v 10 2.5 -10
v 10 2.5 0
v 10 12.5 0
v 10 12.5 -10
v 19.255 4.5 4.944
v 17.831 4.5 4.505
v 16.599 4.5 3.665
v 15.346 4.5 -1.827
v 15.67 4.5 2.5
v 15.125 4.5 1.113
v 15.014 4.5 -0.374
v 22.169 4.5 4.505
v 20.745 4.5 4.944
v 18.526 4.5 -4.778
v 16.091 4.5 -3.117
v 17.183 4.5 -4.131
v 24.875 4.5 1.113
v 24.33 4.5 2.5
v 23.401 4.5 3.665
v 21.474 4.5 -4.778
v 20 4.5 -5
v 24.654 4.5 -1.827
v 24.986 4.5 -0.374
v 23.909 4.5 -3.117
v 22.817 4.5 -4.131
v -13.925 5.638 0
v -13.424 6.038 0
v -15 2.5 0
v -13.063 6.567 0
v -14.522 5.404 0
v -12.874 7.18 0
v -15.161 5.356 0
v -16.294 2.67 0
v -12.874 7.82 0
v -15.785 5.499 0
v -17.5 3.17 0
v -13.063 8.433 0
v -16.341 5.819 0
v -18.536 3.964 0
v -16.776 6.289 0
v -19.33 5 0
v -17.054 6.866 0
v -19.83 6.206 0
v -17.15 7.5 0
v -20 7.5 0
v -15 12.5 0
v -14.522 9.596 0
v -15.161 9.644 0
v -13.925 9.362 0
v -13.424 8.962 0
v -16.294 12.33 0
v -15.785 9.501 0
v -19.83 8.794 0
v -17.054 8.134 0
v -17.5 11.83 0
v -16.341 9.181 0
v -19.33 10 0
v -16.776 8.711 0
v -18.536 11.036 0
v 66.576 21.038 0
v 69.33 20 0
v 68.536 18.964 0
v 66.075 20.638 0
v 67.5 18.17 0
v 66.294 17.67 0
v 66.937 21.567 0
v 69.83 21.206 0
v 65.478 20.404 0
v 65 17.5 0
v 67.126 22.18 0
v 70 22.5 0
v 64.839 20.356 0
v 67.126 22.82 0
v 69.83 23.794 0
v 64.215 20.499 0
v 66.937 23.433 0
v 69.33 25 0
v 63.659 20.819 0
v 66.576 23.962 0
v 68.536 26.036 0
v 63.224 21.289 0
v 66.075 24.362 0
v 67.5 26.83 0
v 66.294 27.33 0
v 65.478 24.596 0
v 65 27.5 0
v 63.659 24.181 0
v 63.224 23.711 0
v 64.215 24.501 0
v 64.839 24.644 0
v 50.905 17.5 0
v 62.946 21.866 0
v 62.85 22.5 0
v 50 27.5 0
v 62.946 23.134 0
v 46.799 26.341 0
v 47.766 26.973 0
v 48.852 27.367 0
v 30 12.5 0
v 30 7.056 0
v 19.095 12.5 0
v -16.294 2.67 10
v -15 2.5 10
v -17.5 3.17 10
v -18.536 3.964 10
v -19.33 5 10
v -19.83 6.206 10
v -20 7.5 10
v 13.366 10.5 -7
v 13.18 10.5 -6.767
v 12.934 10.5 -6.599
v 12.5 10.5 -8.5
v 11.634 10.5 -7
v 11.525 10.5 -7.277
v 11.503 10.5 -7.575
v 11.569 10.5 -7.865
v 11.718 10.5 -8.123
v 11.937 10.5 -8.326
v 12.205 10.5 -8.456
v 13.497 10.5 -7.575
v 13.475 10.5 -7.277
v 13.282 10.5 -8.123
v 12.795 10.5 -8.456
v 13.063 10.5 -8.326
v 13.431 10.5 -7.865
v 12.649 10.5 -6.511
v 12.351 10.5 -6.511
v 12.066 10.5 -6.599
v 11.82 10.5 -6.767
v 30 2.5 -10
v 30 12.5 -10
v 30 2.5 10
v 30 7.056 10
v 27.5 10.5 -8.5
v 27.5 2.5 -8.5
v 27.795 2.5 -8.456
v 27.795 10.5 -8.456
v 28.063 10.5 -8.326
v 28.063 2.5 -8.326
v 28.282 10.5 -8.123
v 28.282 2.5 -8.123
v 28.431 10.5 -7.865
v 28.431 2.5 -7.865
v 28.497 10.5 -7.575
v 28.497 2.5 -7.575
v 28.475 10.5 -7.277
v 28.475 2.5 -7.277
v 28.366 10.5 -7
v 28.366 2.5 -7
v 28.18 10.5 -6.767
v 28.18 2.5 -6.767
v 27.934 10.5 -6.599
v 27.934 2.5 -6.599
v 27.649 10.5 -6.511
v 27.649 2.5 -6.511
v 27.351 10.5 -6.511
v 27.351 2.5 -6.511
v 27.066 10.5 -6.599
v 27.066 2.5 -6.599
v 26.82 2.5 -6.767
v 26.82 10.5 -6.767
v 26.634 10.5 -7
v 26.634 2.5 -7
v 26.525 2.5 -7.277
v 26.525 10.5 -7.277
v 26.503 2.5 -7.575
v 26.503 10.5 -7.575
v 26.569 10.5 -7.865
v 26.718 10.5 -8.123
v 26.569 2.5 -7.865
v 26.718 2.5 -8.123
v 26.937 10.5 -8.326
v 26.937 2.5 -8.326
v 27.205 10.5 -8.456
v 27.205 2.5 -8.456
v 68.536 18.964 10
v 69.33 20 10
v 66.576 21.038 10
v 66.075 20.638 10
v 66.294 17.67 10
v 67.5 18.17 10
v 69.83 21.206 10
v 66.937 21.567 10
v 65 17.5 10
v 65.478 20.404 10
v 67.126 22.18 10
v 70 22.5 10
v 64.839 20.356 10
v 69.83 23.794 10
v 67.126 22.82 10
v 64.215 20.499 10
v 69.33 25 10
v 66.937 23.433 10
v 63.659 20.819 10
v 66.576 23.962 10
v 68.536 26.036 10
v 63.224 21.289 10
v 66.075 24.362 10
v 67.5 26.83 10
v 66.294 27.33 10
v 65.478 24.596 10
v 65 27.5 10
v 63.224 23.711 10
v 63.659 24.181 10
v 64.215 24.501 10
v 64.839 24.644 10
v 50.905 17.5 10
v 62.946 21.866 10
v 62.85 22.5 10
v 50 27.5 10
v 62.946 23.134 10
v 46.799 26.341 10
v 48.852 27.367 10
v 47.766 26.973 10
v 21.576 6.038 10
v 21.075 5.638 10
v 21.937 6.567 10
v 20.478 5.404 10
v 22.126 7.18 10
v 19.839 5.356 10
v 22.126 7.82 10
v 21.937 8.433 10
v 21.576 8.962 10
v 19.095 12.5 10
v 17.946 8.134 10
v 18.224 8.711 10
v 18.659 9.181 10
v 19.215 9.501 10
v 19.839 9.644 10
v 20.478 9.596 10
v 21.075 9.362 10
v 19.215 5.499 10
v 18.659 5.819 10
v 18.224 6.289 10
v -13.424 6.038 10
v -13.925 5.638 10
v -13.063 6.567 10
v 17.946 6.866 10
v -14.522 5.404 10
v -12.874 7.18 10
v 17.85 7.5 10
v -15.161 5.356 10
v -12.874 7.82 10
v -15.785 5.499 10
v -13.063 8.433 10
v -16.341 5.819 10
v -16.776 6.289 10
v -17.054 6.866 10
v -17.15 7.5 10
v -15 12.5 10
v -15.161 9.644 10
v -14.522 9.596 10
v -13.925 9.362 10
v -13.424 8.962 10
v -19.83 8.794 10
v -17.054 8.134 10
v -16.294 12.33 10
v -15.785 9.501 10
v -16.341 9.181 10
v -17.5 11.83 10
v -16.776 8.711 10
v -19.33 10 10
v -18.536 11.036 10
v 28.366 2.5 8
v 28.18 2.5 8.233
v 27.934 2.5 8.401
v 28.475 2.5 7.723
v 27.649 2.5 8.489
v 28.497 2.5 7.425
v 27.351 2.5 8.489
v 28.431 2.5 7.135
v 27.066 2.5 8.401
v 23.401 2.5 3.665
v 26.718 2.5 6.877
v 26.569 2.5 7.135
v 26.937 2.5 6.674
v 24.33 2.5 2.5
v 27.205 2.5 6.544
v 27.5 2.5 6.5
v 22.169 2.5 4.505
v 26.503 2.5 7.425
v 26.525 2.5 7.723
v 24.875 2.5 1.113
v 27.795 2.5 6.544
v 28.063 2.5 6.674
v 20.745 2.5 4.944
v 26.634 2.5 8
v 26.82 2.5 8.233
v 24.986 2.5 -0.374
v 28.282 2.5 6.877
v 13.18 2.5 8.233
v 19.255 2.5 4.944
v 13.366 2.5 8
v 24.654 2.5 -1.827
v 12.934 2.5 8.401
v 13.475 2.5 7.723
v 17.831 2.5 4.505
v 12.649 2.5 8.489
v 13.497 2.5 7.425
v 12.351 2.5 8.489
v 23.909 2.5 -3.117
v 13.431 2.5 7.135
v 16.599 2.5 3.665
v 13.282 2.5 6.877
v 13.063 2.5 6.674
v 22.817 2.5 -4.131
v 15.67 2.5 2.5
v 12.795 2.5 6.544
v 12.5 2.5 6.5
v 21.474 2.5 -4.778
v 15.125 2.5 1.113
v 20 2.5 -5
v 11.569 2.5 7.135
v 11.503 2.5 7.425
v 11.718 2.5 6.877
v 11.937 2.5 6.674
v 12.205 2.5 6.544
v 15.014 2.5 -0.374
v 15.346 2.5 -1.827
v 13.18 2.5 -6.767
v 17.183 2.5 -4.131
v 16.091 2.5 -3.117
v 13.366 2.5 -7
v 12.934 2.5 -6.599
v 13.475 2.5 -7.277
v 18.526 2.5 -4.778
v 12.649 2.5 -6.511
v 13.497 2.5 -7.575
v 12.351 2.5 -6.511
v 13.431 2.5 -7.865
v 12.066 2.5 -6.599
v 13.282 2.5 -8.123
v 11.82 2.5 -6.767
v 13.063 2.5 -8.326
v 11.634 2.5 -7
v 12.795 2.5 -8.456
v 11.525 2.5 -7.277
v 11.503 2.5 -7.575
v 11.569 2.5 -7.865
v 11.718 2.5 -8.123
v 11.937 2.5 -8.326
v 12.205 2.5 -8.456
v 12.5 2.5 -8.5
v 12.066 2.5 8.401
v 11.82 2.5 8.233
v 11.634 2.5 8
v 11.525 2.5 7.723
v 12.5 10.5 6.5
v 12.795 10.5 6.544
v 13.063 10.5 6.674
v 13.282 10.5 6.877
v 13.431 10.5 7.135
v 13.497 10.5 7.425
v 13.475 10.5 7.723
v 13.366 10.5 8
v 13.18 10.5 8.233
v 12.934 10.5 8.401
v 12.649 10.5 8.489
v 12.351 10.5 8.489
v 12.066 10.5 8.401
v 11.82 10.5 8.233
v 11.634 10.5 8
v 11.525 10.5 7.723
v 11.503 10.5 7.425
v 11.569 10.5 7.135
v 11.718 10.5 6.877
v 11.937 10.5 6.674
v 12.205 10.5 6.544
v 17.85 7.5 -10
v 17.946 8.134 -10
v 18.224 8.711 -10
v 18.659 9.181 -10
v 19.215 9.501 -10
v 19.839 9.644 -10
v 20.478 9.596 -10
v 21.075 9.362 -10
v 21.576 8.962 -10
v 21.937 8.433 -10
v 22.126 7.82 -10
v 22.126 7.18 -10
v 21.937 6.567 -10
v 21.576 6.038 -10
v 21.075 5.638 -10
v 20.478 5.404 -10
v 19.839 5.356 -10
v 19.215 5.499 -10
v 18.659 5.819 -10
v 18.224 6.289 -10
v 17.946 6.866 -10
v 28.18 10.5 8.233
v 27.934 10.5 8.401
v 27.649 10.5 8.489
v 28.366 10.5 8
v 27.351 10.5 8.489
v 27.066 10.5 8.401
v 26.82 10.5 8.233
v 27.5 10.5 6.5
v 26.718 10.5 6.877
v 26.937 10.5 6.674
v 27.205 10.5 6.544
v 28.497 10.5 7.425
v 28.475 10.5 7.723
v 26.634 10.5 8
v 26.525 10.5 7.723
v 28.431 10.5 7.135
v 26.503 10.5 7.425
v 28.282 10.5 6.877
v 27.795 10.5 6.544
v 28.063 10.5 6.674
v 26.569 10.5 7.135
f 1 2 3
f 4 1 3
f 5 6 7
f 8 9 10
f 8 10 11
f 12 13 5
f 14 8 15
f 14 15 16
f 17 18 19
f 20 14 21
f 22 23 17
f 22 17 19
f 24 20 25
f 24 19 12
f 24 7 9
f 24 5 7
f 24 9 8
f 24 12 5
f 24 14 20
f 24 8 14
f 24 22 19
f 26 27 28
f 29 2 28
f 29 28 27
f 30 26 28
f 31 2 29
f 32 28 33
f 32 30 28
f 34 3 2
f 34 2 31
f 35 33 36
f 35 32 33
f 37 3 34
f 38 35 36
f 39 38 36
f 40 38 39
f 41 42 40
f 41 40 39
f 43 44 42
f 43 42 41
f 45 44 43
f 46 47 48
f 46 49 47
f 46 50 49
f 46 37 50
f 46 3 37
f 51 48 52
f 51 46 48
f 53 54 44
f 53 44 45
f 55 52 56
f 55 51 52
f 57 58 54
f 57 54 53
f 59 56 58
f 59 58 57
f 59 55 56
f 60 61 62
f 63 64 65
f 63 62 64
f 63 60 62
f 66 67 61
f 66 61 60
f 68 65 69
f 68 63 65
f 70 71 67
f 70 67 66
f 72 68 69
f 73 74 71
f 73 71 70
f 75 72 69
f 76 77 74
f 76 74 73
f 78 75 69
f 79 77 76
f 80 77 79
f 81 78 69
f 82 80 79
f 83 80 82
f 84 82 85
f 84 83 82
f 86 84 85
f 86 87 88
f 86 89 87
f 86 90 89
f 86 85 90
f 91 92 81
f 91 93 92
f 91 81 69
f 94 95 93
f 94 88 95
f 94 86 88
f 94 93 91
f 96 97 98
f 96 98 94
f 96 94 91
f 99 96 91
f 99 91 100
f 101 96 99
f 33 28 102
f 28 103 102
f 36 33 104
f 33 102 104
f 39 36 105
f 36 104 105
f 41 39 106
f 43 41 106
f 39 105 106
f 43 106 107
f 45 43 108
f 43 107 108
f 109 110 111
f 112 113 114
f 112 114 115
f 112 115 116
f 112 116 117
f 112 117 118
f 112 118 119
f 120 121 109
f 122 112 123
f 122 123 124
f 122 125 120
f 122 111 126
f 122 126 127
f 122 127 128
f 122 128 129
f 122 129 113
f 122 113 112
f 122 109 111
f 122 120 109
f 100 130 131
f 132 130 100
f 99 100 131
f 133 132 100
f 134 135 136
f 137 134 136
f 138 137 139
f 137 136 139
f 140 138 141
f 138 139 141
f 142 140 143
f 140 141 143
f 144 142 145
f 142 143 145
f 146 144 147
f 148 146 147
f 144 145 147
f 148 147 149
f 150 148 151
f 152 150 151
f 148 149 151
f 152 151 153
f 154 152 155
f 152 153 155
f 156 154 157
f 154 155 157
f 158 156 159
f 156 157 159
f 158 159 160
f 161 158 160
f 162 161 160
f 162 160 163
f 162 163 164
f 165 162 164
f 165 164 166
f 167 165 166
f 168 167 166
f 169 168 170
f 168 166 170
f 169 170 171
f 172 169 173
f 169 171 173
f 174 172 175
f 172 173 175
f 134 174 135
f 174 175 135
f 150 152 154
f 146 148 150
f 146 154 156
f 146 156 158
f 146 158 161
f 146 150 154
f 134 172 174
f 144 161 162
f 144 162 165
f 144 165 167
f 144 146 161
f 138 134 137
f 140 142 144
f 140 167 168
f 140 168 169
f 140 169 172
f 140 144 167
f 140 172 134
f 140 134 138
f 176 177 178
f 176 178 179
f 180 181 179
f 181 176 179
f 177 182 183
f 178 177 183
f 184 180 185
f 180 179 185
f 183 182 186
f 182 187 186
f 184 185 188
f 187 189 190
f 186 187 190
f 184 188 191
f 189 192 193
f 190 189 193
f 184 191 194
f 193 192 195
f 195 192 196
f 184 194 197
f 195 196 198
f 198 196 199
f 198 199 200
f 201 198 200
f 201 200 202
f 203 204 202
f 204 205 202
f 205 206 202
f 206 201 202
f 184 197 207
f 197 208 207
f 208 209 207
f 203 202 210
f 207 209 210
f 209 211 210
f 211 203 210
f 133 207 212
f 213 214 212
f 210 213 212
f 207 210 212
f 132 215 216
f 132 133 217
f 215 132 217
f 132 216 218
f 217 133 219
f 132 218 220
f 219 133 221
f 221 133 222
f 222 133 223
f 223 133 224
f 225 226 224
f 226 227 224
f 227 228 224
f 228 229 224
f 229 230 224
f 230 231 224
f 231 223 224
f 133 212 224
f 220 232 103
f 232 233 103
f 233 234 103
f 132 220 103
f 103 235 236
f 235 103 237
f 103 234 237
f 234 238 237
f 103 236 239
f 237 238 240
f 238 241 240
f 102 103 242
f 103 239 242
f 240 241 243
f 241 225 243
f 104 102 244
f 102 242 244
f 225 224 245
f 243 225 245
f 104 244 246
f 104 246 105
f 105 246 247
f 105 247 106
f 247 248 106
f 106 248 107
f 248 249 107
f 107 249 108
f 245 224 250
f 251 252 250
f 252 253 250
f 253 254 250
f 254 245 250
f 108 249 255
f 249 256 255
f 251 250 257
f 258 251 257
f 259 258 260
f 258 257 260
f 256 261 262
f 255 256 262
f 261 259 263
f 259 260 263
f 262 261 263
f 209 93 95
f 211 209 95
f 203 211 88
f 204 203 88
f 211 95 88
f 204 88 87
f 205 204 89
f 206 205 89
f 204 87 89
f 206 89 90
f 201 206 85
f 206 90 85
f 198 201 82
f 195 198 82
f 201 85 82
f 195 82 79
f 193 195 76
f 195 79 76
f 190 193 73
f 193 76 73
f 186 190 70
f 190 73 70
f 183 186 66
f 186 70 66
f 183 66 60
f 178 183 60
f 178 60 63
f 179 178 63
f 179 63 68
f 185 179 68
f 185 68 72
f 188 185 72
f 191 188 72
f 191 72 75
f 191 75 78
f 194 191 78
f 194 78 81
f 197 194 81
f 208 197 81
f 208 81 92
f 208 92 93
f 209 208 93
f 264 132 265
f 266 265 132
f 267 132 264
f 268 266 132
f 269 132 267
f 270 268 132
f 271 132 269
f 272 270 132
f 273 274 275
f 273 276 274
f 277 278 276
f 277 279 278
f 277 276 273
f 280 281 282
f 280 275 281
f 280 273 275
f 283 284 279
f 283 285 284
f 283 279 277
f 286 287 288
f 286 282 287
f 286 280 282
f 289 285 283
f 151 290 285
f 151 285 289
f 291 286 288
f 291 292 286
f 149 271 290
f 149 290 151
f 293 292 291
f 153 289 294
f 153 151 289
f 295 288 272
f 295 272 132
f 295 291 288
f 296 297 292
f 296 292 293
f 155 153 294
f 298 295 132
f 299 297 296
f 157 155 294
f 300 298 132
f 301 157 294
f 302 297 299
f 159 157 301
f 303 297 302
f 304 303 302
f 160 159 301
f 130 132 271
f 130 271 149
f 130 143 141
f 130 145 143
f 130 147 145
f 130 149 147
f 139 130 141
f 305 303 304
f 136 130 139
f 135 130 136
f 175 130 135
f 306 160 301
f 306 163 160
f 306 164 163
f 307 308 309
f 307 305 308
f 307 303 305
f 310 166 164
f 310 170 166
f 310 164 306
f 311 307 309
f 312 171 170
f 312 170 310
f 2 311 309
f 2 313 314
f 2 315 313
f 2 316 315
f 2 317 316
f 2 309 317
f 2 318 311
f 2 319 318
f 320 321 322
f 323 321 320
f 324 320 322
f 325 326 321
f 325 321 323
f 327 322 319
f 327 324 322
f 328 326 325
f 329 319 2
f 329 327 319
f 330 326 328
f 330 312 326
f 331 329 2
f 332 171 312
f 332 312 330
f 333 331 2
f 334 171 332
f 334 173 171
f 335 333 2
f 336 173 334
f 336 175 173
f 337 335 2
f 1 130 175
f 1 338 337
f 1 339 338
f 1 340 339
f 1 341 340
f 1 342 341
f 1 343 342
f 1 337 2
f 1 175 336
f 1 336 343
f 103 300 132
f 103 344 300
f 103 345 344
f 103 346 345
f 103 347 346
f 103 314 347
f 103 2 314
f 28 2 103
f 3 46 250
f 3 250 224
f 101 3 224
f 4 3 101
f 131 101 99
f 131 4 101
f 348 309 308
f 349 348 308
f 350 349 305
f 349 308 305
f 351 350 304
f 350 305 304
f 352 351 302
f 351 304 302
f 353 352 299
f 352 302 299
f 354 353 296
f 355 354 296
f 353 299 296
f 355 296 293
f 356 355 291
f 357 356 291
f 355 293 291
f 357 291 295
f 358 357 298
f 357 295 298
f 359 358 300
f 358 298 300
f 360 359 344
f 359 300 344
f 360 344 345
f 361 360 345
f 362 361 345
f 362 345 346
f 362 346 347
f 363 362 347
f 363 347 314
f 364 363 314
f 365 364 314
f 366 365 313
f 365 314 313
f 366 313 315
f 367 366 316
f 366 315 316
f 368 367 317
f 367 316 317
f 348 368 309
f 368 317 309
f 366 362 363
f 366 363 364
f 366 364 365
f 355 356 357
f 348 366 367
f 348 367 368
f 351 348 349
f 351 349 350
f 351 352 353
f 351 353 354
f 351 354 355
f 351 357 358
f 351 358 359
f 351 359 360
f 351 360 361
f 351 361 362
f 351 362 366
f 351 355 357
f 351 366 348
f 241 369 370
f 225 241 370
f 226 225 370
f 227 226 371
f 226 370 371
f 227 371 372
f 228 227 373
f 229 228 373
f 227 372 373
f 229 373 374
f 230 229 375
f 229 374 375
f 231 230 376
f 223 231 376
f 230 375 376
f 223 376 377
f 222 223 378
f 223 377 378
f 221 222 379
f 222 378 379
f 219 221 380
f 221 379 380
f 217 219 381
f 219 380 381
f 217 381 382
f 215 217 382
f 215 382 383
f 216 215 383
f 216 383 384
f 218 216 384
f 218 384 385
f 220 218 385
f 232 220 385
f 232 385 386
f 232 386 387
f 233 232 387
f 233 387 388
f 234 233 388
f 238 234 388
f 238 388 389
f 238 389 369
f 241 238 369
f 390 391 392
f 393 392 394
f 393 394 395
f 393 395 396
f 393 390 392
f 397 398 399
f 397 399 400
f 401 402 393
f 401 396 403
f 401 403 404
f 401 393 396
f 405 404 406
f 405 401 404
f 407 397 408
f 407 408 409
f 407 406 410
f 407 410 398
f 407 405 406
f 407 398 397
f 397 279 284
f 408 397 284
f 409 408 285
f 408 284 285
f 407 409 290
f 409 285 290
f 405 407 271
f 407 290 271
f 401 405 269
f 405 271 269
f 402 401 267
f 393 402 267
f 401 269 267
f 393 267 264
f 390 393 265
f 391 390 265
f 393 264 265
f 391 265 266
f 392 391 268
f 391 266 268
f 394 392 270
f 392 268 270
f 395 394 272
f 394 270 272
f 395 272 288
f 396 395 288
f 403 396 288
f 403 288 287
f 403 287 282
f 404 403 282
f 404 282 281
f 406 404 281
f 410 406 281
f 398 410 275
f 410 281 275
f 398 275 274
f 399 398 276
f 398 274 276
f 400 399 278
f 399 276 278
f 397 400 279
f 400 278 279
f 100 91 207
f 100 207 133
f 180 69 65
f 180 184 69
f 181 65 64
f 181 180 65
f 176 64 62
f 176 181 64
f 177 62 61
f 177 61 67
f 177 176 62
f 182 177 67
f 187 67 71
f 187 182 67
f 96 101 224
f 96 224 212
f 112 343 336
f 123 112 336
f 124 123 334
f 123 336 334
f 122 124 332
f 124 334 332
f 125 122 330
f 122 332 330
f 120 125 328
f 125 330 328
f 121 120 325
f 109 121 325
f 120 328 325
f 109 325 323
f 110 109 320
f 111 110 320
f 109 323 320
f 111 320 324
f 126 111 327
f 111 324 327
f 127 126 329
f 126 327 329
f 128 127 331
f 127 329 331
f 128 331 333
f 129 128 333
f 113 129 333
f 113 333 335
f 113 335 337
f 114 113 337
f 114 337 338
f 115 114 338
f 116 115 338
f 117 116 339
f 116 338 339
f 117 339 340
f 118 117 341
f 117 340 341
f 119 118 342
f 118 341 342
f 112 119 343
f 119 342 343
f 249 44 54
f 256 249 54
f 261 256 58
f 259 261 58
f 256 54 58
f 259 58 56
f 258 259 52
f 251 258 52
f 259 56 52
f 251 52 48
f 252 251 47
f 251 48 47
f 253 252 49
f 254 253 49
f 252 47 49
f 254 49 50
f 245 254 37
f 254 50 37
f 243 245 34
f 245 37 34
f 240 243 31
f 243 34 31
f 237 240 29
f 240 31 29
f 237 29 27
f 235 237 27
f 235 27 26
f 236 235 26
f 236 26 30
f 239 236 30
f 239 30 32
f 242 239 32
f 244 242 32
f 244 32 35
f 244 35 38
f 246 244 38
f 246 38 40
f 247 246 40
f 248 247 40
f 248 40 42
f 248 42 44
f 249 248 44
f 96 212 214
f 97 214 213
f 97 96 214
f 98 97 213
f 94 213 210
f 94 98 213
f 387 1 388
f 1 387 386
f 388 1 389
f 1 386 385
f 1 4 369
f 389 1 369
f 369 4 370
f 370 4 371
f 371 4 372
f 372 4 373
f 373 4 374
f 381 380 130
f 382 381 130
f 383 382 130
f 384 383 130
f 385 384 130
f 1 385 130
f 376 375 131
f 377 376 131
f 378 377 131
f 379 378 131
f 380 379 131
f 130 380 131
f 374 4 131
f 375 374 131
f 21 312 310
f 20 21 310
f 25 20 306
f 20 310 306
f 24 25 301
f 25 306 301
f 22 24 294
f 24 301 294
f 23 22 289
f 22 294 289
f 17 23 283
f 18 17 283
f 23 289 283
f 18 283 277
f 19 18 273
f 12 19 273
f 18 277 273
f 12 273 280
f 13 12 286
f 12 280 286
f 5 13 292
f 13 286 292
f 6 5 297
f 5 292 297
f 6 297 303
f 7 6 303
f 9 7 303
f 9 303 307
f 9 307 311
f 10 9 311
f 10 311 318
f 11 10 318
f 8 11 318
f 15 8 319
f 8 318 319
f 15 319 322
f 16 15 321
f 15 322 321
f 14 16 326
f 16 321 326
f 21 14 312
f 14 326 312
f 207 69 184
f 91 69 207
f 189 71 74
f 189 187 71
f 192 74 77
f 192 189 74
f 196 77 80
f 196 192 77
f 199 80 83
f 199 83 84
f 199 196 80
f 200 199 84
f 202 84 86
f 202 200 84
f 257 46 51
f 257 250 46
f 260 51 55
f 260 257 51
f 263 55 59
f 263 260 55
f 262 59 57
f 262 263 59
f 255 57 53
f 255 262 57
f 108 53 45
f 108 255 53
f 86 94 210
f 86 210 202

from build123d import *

# Parameters (mm, degrees)
EXTRUDE_1_DEPTH     = 10
SKETCH_3_W          = 20
SKETCH_3_H          = 10
EXTRUDE_2_DEPTH     = 20
FILLET_1_R          = 5
SKETCH_5_R          = 2.15
CUT_EXTRUDE_2_DEPTH = 78.821912081
SKETCH_9_R          = 1
CUT_EXTRUDE_4_DEPTH = 8
SKETCH_10_R         = 5
CUT_EXTRUDE_8_DEPTH = 2


with BuildPart() as part:
    # 스케치2 → 보스-돌출1 (new body)
    with BuildSketch(Plane.XY):
        with BuildLine():
            Line((70, 27.5), (70, 17.5))
            Line((70, 17.5), (50.905124838, 17.5))
            Line((50.905124838, 17.5), (23.200921998, 3.658893602))
            ThreePointArc((23.200921998, 3.658893602), (21.702126319, 2.798642112), (20, 2.5))
            Line((20, 2.5), (-20, 2.5))
            Line((-20, 2.5), (-20, 12.5))
            Line((-20, 12.5), (19.094875162, 12.5))
            Line((19.094875162, 12.5), (46.799078002, 26.341106398))
            ThreePointArc((46.799078002, 26.341106398), (48.297873681, 27.201357888), (50, 27.5))
            Line((50, 27.5), (70, 27.5))
        make_face()
    extrude(amount=EXTRUDE_1_DEPTH)

    # 스케치3 → 보스-돌출2 (add)
    with BuildSketch(Plane.XY.offset(10)):
        with Locations((19.999999999, 7.5)):
            Rectangle(SKETCH_3_W, SKETCH_3_H)
    extrude(amount=-EXTRUDE_2_DEPTH)

    # 필렛1
    fillet_1_edges = [part.edges().sort_by_distance(p)[0] for p in [
        (-20, 12.5, 5),
        (-20, 2.5, 5),
        (70, 17.5, 5),
        (70, 27.5, 5),
    ]]
    fillet(fillet_1_edges, radius=FILLET_1_R - 0.0001)  # a hair under: the kernel refuses the full size

    # 스케치5 → 컷-돌출2 (cut, through all)
    with BuildSketch(Plane(origin=(0, 0, -10), x_dir=(-1, 0, 0), z_dir=(0, 0, -1))):
        with Locations((-19.999999999, 7.5)):
            Circle(SKETCH_5_R)
        with Locations((-65, 22.5)):
            Circle(SKETCH_5_R)
        with Locations((15, 7.5)):
            Circle(SKETCH_5_R)
    extrude(amount=-CUT_EXTRUDE_2_DEPTH, mode=Mode.SUBTRACT)

    # 스케치9 → 컷-돌출4 (cut)
    with BuildSketch(Plane.XZ.offset(-2.5)):
        with Locations(Location((12.499999999, 7.5, 0), (0, 0, 270))):
            Circle(SKETCH_9_R)
        with Locations(Location((27.499999999, 7.5, 0), (0, 0, 270))):
            Circle(SKETCH_9_R)
        with Locations(Location((12.499999999, -7.5, 0), (0, 0, 270))):
            Circle(SKETCH_9_R)
        with Locations(Location((27.499999999, -7.5, 0), (0, 0, 270))):
            Circle(SKETCH_9_R)
    extrude(amount=-CUT_EXTRUDE_4_DEPTH, mode=Mode.SUBTRACT)

    # 스케치10 → 컷-돌출8 (cut)
    with BuildSketch(Plane.XZ.offset(-2.5)):
        with Locations(Location((19.999999999, 0, 0), (0, 0, 270))):
            Circle(SKETCH_10_R)
    extrude(amount=-CUT_EXTRUDE_8_DEPTH, mode=Mode.SUBTRACT)


solid = part.part
